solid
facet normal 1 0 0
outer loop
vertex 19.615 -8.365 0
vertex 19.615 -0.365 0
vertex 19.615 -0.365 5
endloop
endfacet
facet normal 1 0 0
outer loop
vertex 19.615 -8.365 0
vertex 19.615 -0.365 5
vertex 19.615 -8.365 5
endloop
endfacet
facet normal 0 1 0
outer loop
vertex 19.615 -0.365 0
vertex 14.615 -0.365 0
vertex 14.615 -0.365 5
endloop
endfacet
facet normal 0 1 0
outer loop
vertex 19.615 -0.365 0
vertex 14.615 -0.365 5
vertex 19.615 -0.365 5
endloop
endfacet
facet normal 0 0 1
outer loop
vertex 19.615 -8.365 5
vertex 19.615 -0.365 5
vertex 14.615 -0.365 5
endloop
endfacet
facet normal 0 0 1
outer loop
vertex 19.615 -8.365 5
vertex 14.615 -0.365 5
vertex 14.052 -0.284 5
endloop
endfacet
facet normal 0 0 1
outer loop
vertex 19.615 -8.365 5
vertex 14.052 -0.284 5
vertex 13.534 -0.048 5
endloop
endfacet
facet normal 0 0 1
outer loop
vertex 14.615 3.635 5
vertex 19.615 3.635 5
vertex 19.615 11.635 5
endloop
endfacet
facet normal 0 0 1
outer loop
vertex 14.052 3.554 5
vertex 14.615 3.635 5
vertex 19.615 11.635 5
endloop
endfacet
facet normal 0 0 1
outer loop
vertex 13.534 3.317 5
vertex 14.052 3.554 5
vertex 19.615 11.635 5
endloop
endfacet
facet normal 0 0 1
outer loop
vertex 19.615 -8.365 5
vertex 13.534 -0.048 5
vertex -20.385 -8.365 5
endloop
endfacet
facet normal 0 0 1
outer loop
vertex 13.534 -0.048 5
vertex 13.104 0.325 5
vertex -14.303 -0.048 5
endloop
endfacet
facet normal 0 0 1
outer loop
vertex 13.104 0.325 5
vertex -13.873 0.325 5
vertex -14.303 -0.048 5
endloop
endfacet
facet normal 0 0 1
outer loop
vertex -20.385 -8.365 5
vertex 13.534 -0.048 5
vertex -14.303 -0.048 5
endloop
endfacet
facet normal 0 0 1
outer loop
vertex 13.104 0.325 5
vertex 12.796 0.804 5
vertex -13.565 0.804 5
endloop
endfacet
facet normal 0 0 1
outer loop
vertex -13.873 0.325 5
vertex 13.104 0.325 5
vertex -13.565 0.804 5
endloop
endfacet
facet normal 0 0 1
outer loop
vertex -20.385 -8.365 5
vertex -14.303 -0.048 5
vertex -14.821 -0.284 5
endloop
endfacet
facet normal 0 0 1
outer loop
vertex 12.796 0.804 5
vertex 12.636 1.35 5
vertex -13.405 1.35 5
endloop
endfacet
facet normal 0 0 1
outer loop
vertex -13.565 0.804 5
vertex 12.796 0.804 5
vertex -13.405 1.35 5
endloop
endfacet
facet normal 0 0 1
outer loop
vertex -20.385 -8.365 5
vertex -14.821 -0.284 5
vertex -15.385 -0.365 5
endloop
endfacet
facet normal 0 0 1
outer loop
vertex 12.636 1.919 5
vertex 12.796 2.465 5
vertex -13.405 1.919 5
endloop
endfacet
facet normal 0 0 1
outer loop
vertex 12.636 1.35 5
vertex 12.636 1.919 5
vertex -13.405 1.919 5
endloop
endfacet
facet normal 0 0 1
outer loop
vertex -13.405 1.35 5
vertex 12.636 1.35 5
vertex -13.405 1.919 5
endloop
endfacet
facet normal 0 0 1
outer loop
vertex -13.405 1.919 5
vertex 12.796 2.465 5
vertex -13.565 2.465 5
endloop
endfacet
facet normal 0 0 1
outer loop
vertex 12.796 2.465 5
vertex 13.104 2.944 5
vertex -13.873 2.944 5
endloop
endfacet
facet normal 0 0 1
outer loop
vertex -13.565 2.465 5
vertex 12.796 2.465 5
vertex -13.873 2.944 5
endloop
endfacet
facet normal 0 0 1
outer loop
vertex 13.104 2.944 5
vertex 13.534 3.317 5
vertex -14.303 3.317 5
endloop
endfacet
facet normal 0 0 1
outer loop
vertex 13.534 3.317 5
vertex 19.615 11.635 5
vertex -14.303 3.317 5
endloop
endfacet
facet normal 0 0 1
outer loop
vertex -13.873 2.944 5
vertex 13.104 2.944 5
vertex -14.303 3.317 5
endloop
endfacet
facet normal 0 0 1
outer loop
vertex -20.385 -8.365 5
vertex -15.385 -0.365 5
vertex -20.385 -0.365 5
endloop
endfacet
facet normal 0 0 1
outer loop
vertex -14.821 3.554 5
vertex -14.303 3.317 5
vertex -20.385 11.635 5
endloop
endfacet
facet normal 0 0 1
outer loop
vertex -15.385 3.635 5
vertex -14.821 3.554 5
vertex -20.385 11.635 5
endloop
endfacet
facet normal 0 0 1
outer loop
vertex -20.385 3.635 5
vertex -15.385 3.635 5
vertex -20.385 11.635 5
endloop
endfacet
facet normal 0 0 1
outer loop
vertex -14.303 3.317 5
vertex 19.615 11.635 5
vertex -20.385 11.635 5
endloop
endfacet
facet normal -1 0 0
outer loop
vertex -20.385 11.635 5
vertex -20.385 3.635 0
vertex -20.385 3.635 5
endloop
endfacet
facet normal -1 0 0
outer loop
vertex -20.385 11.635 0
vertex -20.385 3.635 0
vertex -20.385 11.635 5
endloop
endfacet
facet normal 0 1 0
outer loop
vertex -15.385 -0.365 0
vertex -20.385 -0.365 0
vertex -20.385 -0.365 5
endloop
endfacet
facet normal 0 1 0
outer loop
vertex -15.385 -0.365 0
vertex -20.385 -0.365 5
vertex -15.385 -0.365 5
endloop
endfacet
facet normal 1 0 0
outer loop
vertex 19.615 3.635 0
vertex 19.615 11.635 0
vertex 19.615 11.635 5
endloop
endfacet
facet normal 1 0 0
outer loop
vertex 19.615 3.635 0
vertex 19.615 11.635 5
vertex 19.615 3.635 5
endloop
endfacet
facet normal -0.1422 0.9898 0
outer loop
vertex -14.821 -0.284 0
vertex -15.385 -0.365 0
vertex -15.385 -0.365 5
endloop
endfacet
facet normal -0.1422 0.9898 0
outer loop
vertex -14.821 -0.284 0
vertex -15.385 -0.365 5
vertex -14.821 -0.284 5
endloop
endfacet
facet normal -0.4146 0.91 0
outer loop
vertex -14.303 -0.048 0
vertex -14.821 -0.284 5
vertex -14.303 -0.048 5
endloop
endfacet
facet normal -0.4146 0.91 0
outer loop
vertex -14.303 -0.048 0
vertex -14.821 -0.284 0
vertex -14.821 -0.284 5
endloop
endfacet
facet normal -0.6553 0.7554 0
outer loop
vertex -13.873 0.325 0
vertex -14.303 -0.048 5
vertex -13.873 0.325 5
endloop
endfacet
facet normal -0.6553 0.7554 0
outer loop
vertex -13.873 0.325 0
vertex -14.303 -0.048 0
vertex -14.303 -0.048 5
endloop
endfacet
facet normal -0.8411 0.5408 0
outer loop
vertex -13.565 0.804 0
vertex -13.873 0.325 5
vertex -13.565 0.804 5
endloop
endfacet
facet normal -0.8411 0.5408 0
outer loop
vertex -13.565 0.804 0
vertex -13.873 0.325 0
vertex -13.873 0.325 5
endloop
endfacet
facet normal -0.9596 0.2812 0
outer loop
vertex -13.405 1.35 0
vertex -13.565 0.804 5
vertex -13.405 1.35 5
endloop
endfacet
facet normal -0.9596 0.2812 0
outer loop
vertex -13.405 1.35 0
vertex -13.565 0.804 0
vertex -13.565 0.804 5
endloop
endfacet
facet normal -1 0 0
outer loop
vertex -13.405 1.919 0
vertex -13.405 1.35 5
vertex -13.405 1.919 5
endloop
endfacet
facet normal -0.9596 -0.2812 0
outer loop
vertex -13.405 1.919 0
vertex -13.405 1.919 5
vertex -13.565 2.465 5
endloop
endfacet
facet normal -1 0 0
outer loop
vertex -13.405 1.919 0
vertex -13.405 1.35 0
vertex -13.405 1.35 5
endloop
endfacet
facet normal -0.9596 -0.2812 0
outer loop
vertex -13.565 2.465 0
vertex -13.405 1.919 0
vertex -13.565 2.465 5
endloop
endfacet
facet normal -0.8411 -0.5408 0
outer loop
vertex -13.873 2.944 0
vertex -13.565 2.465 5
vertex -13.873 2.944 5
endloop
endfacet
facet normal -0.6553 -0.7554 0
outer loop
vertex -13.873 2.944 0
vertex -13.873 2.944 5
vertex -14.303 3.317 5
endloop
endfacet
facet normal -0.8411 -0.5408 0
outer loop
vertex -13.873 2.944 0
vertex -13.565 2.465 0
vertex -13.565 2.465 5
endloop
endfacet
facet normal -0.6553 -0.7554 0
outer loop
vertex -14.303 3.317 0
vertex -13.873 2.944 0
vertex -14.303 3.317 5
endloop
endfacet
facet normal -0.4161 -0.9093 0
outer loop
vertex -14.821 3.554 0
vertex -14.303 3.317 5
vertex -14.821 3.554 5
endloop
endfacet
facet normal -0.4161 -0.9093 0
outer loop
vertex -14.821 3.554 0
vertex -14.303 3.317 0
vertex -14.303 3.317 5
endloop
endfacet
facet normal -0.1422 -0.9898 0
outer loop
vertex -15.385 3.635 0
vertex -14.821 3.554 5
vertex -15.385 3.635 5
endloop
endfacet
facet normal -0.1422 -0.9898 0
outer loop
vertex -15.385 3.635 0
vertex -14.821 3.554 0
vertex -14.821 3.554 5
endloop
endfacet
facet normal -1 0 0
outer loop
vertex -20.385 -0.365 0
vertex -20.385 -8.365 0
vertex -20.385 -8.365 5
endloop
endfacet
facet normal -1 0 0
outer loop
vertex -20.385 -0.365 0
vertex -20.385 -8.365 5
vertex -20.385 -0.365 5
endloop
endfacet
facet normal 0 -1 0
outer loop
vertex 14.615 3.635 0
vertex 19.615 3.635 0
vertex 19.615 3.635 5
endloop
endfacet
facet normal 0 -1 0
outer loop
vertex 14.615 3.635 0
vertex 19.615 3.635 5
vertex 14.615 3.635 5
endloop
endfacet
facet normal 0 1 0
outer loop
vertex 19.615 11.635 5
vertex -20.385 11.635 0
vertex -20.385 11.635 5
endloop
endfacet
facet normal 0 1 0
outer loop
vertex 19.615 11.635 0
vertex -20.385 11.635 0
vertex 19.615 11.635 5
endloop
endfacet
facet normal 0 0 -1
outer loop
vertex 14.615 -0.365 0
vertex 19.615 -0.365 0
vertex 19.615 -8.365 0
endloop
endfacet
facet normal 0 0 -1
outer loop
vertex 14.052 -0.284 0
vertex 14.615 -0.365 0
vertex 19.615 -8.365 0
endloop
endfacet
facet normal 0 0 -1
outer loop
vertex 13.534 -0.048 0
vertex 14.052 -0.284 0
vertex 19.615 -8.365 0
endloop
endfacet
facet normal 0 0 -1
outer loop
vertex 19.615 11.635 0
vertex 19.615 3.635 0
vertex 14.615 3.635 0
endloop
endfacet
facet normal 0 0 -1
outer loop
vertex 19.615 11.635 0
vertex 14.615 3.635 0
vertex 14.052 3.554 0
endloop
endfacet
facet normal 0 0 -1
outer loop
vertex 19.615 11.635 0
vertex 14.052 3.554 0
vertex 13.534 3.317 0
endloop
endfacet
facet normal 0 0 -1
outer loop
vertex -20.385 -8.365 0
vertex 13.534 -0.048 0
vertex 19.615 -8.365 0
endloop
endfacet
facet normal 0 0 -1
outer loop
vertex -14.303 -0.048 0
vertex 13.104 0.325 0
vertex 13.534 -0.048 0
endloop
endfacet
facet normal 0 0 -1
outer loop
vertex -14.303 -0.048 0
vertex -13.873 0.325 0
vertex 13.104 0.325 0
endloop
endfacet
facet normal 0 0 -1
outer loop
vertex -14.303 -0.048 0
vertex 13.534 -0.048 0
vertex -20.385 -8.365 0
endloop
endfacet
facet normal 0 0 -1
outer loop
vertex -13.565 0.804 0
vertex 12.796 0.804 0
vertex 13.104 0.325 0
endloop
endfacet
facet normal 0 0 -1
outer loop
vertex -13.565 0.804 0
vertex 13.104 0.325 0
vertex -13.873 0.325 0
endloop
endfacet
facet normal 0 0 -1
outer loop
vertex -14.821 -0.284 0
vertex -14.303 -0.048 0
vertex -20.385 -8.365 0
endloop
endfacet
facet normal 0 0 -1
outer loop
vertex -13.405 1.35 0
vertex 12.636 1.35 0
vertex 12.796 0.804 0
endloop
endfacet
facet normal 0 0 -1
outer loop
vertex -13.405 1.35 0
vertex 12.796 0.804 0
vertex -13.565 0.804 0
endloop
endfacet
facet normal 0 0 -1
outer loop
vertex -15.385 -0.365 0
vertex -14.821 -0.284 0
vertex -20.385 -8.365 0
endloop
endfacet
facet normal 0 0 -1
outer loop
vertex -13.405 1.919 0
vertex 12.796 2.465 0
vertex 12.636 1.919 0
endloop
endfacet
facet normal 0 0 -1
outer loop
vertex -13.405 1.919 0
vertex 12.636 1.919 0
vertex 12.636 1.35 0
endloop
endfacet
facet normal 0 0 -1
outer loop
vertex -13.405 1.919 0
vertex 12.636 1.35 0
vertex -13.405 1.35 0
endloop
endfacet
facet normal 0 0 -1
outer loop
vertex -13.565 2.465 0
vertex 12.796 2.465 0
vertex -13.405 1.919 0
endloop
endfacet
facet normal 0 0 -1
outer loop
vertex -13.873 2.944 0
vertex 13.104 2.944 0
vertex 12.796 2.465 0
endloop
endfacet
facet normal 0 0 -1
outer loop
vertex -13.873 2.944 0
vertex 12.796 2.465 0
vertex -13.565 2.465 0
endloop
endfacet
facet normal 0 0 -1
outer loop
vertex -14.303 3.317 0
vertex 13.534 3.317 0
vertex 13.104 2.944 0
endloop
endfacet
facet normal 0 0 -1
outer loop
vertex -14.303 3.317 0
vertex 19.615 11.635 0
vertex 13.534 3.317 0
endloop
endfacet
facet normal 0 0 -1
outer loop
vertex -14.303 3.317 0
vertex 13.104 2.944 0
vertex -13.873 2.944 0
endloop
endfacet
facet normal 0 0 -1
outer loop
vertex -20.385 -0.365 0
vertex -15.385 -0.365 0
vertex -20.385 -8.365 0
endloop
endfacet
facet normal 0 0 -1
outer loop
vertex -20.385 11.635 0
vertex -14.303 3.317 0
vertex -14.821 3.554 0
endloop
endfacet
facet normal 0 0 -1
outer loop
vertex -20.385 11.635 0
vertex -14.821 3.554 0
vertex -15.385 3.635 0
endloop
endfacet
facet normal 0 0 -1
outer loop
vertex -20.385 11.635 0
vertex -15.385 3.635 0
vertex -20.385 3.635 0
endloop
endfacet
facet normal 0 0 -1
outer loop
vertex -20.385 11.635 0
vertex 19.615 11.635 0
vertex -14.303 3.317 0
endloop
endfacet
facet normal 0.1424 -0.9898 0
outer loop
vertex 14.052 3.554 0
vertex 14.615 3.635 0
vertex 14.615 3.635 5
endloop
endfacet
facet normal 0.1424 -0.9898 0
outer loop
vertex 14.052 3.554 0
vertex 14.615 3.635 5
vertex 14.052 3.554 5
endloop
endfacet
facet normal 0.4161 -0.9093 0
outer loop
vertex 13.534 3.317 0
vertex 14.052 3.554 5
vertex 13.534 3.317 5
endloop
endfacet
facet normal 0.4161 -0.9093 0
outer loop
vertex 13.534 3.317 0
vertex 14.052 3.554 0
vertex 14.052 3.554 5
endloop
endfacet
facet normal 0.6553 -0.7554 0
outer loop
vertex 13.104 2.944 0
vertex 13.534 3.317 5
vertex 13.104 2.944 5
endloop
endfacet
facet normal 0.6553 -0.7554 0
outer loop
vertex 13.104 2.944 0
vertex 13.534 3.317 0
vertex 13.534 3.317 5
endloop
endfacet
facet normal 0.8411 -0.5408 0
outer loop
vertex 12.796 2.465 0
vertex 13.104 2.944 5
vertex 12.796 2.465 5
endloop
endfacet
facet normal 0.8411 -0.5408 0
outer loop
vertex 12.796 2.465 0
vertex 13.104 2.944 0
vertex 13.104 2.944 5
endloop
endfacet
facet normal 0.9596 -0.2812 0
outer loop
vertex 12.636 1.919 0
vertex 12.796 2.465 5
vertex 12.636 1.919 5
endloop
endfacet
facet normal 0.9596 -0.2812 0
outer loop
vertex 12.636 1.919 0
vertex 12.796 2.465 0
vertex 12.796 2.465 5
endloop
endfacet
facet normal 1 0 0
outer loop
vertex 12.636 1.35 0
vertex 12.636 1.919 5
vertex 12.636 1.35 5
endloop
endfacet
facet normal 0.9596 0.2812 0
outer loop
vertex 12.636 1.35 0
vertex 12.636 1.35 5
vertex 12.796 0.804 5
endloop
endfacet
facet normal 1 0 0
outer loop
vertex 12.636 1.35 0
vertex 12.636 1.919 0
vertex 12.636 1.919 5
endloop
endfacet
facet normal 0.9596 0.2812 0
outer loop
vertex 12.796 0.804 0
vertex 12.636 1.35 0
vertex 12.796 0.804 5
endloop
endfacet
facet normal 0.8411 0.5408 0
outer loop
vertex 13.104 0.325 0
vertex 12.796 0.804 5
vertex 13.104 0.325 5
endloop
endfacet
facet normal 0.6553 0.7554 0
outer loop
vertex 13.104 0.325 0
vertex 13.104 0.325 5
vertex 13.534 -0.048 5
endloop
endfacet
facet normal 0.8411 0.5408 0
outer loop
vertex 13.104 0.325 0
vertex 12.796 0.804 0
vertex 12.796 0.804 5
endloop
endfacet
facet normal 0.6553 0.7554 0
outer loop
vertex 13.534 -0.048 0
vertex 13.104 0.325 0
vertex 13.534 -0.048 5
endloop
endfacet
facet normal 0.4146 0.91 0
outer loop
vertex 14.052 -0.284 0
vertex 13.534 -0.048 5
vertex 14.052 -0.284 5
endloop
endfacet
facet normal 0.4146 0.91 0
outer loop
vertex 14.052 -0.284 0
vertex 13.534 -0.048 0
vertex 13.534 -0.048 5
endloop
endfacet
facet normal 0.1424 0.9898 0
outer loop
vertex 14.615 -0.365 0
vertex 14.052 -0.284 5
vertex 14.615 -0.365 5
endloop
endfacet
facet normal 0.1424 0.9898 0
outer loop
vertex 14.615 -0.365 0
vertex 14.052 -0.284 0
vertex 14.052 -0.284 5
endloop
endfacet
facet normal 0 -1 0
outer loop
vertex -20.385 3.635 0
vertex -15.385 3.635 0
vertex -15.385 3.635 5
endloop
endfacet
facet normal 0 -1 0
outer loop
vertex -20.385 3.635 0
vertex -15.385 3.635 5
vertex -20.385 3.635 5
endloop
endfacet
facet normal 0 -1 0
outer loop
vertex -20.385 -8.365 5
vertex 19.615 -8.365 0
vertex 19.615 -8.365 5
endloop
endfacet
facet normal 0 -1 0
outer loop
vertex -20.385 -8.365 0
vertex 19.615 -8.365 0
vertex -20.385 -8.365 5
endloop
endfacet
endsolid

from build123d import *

# Parameters (mm, degrees)
BOSS_EXTRUDE1_DEPTH = 5


with BuildPart() as part:
    # Sketch1 → Boss-Extrude1 (new body)
    with BuildSketch(Plane.XY):
        with BuildLine():
            Line((19.615384615, -0.365384615), (19.615384615, -8.365384615))
            Line((19.615384615, -8.365384615), (-20.384615385, -8.365384615))
            Line((-20.384615385, -8.365384615), (-20.384615385, -0.365384615))
            Line((-20.384615385, -0.365384615), (-15.384615385, -0.365384615))
            ThreePointArc((-15.384615385, -0.365384615), (-13.384615385, 1.634615385), (-15.384615385, 3.634615385))
            Line((-15.384615385, 3.634615385), (-20.384615385, 3.634615385))
            Line((-20.384615385, 3.634615385), (-20.384615385, 11.634615385))
            Line((-20.384615385, 11.634615385), (19.615384615, 11.634615385))
            Line((19.615384615, 11.634615385), (19.615384615, 3.634615385))
            Line((19.615384615, 3.634615385), (14.615384615, 3.634615385))
            ThreePointArc((14.615384615, 3.634615385), (12.615384615, 1.634615385), (14.615384615, -0.365384615))
            Line((14.615384615, -0.365384615), (19.615384615, -0.365384615))
        make_face()
    extrude(amount=BOSS_EXTRUDE1_DEPTH)


solid = part.part
